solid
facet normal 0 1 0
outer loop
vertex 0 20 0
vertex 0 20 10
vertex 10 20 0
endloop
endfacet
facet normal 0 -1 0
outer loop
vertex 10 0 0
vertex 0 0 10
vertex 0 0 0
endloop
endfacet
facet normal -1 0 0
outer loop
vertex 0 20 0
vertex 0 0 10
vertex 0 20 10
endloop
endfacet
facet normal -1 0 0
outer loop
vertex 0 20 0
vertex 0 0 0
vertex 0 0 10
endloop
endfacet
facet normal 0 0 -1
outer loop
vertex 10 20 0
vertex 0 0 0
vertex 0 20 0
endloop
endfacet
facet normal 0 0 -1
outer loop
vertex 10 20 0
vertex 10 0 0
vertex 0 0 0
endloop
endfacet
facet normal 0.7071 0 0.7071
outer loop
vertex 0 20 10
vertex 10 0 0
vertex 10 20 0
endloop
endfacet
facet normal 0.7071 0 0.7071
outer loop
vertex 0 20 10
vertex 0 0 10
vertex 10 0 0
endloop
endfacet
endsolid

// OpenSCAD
/**
    Makes a right triangle with the desired side lengths and thickness (z)
    **** Deprecated
*/
module rightTriangle(horizontalLength, verticalLength, thickness) {
    hull() {
        cube([horizontalLength, thickness, 0.01]);
        cube([0.01, thickness, verticalLength]);
    }
}
module rightTriangle3d(a = 10, b = 10, length = 5) {
    echo("***** RightTriangle3d *****");
    echo("Length: ", length);
    translate([0, length, 0])  rotate([90, 0, 0]) linear_extrude(length) rightTriangle2d(a = a, b = b);
}

module rightTriangle2d(a = 10, b = 20) {
    echo("***** RightTriangle2d *****");
    points = [[0, 0], [a, 0], [0, b]];
    echo(str("Points: ", points,  ", a: ", a, ", b: ", b, ", c (calculated): ", c(a, b)));
    polygon(points = points);
}

//Equilateral Triangle
//size = 10;
//points = [[0, 0], [size, 0], [size / 2, size]];

// ======================== Functions ================

//Calculates the hyponetuse of a right triangle given the two sides a and b
function c(a, b) = sqrt(pow(a, 2) + pow(b, 2)); 

//rightTriangle2d(a = 10, b = 10);
rightTriangle3d(a = 10, b = 10, length = 20);
